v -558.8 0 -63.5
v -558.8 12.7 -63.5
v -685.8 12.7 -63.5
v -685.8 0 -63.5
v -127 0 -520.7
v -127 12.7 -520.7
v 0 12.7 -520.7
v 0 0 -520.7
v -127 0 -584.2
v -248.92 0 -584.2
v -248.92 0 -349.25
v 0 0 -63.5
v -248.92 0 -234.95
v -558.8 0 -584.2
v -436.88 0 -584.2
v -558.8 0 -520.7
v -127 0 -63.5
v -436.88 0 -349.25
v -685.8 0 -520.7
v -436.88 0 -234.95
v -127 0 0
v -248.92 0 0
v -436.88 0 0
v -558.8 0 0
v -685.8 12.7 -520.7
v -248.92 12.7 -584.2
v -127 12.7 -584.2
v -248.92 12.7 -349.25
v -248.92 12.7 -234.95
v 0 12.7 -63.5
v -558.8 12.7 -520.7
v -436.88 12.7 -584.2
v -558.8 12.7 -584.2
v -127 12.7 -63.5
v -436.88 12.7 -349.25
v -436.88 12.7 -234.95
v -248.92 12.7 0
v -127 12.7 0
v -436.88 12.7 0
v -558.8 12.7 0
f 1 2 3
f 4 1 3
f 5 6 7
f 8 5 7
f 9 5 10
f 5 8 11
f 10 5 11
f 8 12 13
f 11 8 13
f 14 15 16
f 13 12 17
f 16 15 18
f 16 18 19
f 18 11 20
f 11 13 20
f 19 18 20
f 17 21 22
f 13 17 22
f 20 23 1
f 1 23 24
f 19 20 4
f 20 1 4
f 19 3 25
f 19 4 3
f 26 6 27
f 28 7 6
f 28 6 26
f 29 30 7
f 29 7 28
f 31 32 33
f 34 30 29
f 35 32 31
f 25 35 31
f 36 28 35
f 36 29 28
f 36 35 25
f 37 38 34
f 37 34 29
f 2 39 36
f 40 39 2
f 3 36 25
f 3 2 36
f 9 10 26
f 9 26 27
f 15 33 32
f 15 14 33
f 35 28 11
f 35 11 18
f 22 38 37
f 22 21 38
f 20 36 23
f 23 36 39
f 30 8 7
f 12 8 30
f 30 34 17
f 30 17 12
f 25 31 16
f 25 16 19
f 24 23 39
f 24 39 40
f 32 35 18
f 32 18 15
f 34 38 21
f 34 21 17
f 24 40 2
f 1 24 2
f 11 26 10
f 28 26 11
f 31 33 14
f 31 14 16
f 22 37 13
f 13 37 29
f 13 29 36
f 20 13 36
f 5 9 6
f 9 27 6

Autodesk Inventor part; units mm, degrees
ref_plane "YZ Plane" through (0, 0, 0) normal (1, 0, 0) x (0, 1, 0)
ref_plane "XZ Plane" through (0, 0, 0) normal (0, 1, 0) x (-1, 0, 0)
ref_plane "XY Plane" through (0, 0, 0) normal (0, 0, 1) x (1, 0, 0)
sketch "Sketch1" plane through (0, 0, 0) normal (0, 1, 0) x (-1, 0, 0)
  line L0 (0, 0) -> (685.8, 0)
  line L1 (685.8, 0) -> (685.8, -584.2)
  line L2 (685.8, -584.2) -> (0, -584.2)
  line L3 (0, -584.2) -> (0, 0)
  dimension "d0" = 685.8
  dimension "d1" = 584.2
extrude "Extrusion1" add sketch "Sketch1" along normal blind 12.7
sketch "Sketch2" plane through (0, 12.7, 0) normal (0, 1, 0) x (1, 0, 0)
  line L0 (-436.88, 0) -> (-248.92, 0)
  line L1 (-248.92, 0) -> (-248.92, 234.95)
  line L2 (-248.92, 234.95) -> (-436.88, 234.95)
  line L3 (-436.88, 234.95) -> (-436.88, 0)
  line L4 (0, 584.2) -> (-685.8, 584.2) projected
  line L5 (-436.88, 584.2) -> (-248.92, 584.2)
  line L6 (-248.92, 584.2) -> (-248.92, 349.25)
  line L7 (-248.92, 349.25) -> (-436.88, 349.25)
  line L8 (-436.88, 349.25) -> (-436.88, 584.2)
  line L9 (-685.8, 0) -> (0, 0) projected
  line L10 (-436.88, 349.25) -> (-436.88, 234.95) construction
  line L11 (-685.8, 584.2) -> (-685.8, 0) construction
  point P0 (-342.9, 0)
  point P1 (-342.9, 0)
  point P2 (-342.9, 0)
  point P3 (-342.9, 584.2)
  point P4 (-342.9, 584.2)
  point P5 (-436.88, 292.1)
  point P6 (-685.8, 292.1)
  dimension "d4" = 187.96
  dimension "d6" = 187.96
  dimension "d10" = 114.3
extrude "Extrusion2" cut sketch "Sketch2" against normal through all
sketch "Sketch3" plane through (0, 12.7, 0) normal (0, 1, 0) x (1, 0, 0)
  line L0 (0, 0) -> (0, 584.2) projected
  line L1 (0, 0) -> (-127, 0)
  line L2 (-127, 0) -> (-127, 63.5)
  line L3 (-127, 63.5) -> (0, 63.5)
  line L4 (0, 63.5) -> (0, 0)
  line L5 (0, 584.2) -> (-127, 584.2)
  line L6 (-127, 584.2) -> (-127, 520.7)
  line L7 (-127, 520.7) -> (0, 520.7)
  line L8 (0, 520.7) -> (0, 584.2)
  line L9 (-685.8, 584.2) -> (-558.8, 584.2)
  line L10 (-558.8, 584.2) -> (-558.8, 520.7)
  line L11 (-558.8, 520.7) -> (-685.8, 520.7)
  line L12 (-685.8, 520.7) -> (-685.8, 584.2)
  line L13 (-685.8, 0) -> (-558.8, 0)
  line L14 (-558.8, 0) -> (-558.8, 63.5)
  line L15 (-558.8, 63.5) -> (-685.8, 63.5)
  line L16 (-685.8, 63.5) -> (-685.8, 0)
  dimension "d11" = 127
  dimension "d12" = 63.5
  dimension "d13" = 127
  dimension "d14" = 63.5
  dimension "d15" = 127
  dimension "d16" = 63.5
  dimension "d17" = 127
  dimension "d18" = 63.5
extrude "Extrusion3" cut sketch "Sketch3" against normal through all
properties part number "base board" material "Wood (Birch)"
